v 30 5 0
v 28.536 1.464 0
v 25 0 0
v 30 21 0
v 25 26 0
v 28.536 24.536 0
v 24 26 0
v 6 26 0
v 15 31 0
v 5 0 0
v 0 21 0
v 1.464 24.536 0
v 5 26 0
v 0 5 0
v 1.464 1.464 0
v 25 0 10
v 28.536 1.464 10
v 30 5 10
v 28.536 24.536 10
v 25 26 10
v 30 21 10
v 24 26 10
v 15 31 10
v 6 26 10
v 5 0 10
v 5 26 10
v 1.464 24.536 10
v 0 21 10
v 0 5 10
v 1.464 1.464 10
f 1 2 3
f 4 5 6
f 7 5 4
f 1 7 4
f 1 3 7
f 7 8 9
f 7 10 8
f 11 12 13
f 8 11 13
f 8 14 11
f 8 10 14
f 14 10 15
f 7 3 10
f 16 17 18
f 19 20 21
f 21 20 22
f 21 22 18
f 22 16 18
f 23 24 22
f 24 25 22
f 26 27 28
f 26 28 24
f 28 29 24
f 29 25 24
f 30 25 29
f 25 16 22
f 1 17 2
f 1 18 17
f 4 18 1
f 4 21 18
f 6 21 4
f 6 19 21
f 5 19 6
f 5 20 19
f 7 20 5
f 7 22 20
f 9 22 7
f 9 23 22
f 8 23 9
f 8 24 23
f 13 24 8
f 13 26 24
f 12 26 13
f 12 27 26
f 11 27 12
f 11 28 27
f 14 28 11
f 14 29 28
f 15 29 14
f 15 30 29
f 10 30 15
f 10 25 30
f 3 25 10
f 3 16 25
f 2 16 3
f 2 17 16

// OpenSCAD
$fn = 32;

// ----------------------------------------------------------------------
// Ratchet pawl: 30 x 26 mm body, beak 5 mm сверху
// ----------------------------------------------------------------------

// --- parameters (mm) ---
profile_height = 10;      // extrusion height
profile_points = 15;      // points of the closed outline

profile = [[0, 5], [1.464, 1.464], [5, 0], [25, 0], [28.536, 1.464], [30, 5], [30, 21], [28.536, 24.536], [25, 26], [24, 26], [15, 31], [6, 26], [5, 26], [1.464, 24.536], [0, 21]];  // single closed polygon, 15 points, counter clockwise

// --- the one profile operation ---
linear_extrude(height = profile_height) polygon(points = profile);
